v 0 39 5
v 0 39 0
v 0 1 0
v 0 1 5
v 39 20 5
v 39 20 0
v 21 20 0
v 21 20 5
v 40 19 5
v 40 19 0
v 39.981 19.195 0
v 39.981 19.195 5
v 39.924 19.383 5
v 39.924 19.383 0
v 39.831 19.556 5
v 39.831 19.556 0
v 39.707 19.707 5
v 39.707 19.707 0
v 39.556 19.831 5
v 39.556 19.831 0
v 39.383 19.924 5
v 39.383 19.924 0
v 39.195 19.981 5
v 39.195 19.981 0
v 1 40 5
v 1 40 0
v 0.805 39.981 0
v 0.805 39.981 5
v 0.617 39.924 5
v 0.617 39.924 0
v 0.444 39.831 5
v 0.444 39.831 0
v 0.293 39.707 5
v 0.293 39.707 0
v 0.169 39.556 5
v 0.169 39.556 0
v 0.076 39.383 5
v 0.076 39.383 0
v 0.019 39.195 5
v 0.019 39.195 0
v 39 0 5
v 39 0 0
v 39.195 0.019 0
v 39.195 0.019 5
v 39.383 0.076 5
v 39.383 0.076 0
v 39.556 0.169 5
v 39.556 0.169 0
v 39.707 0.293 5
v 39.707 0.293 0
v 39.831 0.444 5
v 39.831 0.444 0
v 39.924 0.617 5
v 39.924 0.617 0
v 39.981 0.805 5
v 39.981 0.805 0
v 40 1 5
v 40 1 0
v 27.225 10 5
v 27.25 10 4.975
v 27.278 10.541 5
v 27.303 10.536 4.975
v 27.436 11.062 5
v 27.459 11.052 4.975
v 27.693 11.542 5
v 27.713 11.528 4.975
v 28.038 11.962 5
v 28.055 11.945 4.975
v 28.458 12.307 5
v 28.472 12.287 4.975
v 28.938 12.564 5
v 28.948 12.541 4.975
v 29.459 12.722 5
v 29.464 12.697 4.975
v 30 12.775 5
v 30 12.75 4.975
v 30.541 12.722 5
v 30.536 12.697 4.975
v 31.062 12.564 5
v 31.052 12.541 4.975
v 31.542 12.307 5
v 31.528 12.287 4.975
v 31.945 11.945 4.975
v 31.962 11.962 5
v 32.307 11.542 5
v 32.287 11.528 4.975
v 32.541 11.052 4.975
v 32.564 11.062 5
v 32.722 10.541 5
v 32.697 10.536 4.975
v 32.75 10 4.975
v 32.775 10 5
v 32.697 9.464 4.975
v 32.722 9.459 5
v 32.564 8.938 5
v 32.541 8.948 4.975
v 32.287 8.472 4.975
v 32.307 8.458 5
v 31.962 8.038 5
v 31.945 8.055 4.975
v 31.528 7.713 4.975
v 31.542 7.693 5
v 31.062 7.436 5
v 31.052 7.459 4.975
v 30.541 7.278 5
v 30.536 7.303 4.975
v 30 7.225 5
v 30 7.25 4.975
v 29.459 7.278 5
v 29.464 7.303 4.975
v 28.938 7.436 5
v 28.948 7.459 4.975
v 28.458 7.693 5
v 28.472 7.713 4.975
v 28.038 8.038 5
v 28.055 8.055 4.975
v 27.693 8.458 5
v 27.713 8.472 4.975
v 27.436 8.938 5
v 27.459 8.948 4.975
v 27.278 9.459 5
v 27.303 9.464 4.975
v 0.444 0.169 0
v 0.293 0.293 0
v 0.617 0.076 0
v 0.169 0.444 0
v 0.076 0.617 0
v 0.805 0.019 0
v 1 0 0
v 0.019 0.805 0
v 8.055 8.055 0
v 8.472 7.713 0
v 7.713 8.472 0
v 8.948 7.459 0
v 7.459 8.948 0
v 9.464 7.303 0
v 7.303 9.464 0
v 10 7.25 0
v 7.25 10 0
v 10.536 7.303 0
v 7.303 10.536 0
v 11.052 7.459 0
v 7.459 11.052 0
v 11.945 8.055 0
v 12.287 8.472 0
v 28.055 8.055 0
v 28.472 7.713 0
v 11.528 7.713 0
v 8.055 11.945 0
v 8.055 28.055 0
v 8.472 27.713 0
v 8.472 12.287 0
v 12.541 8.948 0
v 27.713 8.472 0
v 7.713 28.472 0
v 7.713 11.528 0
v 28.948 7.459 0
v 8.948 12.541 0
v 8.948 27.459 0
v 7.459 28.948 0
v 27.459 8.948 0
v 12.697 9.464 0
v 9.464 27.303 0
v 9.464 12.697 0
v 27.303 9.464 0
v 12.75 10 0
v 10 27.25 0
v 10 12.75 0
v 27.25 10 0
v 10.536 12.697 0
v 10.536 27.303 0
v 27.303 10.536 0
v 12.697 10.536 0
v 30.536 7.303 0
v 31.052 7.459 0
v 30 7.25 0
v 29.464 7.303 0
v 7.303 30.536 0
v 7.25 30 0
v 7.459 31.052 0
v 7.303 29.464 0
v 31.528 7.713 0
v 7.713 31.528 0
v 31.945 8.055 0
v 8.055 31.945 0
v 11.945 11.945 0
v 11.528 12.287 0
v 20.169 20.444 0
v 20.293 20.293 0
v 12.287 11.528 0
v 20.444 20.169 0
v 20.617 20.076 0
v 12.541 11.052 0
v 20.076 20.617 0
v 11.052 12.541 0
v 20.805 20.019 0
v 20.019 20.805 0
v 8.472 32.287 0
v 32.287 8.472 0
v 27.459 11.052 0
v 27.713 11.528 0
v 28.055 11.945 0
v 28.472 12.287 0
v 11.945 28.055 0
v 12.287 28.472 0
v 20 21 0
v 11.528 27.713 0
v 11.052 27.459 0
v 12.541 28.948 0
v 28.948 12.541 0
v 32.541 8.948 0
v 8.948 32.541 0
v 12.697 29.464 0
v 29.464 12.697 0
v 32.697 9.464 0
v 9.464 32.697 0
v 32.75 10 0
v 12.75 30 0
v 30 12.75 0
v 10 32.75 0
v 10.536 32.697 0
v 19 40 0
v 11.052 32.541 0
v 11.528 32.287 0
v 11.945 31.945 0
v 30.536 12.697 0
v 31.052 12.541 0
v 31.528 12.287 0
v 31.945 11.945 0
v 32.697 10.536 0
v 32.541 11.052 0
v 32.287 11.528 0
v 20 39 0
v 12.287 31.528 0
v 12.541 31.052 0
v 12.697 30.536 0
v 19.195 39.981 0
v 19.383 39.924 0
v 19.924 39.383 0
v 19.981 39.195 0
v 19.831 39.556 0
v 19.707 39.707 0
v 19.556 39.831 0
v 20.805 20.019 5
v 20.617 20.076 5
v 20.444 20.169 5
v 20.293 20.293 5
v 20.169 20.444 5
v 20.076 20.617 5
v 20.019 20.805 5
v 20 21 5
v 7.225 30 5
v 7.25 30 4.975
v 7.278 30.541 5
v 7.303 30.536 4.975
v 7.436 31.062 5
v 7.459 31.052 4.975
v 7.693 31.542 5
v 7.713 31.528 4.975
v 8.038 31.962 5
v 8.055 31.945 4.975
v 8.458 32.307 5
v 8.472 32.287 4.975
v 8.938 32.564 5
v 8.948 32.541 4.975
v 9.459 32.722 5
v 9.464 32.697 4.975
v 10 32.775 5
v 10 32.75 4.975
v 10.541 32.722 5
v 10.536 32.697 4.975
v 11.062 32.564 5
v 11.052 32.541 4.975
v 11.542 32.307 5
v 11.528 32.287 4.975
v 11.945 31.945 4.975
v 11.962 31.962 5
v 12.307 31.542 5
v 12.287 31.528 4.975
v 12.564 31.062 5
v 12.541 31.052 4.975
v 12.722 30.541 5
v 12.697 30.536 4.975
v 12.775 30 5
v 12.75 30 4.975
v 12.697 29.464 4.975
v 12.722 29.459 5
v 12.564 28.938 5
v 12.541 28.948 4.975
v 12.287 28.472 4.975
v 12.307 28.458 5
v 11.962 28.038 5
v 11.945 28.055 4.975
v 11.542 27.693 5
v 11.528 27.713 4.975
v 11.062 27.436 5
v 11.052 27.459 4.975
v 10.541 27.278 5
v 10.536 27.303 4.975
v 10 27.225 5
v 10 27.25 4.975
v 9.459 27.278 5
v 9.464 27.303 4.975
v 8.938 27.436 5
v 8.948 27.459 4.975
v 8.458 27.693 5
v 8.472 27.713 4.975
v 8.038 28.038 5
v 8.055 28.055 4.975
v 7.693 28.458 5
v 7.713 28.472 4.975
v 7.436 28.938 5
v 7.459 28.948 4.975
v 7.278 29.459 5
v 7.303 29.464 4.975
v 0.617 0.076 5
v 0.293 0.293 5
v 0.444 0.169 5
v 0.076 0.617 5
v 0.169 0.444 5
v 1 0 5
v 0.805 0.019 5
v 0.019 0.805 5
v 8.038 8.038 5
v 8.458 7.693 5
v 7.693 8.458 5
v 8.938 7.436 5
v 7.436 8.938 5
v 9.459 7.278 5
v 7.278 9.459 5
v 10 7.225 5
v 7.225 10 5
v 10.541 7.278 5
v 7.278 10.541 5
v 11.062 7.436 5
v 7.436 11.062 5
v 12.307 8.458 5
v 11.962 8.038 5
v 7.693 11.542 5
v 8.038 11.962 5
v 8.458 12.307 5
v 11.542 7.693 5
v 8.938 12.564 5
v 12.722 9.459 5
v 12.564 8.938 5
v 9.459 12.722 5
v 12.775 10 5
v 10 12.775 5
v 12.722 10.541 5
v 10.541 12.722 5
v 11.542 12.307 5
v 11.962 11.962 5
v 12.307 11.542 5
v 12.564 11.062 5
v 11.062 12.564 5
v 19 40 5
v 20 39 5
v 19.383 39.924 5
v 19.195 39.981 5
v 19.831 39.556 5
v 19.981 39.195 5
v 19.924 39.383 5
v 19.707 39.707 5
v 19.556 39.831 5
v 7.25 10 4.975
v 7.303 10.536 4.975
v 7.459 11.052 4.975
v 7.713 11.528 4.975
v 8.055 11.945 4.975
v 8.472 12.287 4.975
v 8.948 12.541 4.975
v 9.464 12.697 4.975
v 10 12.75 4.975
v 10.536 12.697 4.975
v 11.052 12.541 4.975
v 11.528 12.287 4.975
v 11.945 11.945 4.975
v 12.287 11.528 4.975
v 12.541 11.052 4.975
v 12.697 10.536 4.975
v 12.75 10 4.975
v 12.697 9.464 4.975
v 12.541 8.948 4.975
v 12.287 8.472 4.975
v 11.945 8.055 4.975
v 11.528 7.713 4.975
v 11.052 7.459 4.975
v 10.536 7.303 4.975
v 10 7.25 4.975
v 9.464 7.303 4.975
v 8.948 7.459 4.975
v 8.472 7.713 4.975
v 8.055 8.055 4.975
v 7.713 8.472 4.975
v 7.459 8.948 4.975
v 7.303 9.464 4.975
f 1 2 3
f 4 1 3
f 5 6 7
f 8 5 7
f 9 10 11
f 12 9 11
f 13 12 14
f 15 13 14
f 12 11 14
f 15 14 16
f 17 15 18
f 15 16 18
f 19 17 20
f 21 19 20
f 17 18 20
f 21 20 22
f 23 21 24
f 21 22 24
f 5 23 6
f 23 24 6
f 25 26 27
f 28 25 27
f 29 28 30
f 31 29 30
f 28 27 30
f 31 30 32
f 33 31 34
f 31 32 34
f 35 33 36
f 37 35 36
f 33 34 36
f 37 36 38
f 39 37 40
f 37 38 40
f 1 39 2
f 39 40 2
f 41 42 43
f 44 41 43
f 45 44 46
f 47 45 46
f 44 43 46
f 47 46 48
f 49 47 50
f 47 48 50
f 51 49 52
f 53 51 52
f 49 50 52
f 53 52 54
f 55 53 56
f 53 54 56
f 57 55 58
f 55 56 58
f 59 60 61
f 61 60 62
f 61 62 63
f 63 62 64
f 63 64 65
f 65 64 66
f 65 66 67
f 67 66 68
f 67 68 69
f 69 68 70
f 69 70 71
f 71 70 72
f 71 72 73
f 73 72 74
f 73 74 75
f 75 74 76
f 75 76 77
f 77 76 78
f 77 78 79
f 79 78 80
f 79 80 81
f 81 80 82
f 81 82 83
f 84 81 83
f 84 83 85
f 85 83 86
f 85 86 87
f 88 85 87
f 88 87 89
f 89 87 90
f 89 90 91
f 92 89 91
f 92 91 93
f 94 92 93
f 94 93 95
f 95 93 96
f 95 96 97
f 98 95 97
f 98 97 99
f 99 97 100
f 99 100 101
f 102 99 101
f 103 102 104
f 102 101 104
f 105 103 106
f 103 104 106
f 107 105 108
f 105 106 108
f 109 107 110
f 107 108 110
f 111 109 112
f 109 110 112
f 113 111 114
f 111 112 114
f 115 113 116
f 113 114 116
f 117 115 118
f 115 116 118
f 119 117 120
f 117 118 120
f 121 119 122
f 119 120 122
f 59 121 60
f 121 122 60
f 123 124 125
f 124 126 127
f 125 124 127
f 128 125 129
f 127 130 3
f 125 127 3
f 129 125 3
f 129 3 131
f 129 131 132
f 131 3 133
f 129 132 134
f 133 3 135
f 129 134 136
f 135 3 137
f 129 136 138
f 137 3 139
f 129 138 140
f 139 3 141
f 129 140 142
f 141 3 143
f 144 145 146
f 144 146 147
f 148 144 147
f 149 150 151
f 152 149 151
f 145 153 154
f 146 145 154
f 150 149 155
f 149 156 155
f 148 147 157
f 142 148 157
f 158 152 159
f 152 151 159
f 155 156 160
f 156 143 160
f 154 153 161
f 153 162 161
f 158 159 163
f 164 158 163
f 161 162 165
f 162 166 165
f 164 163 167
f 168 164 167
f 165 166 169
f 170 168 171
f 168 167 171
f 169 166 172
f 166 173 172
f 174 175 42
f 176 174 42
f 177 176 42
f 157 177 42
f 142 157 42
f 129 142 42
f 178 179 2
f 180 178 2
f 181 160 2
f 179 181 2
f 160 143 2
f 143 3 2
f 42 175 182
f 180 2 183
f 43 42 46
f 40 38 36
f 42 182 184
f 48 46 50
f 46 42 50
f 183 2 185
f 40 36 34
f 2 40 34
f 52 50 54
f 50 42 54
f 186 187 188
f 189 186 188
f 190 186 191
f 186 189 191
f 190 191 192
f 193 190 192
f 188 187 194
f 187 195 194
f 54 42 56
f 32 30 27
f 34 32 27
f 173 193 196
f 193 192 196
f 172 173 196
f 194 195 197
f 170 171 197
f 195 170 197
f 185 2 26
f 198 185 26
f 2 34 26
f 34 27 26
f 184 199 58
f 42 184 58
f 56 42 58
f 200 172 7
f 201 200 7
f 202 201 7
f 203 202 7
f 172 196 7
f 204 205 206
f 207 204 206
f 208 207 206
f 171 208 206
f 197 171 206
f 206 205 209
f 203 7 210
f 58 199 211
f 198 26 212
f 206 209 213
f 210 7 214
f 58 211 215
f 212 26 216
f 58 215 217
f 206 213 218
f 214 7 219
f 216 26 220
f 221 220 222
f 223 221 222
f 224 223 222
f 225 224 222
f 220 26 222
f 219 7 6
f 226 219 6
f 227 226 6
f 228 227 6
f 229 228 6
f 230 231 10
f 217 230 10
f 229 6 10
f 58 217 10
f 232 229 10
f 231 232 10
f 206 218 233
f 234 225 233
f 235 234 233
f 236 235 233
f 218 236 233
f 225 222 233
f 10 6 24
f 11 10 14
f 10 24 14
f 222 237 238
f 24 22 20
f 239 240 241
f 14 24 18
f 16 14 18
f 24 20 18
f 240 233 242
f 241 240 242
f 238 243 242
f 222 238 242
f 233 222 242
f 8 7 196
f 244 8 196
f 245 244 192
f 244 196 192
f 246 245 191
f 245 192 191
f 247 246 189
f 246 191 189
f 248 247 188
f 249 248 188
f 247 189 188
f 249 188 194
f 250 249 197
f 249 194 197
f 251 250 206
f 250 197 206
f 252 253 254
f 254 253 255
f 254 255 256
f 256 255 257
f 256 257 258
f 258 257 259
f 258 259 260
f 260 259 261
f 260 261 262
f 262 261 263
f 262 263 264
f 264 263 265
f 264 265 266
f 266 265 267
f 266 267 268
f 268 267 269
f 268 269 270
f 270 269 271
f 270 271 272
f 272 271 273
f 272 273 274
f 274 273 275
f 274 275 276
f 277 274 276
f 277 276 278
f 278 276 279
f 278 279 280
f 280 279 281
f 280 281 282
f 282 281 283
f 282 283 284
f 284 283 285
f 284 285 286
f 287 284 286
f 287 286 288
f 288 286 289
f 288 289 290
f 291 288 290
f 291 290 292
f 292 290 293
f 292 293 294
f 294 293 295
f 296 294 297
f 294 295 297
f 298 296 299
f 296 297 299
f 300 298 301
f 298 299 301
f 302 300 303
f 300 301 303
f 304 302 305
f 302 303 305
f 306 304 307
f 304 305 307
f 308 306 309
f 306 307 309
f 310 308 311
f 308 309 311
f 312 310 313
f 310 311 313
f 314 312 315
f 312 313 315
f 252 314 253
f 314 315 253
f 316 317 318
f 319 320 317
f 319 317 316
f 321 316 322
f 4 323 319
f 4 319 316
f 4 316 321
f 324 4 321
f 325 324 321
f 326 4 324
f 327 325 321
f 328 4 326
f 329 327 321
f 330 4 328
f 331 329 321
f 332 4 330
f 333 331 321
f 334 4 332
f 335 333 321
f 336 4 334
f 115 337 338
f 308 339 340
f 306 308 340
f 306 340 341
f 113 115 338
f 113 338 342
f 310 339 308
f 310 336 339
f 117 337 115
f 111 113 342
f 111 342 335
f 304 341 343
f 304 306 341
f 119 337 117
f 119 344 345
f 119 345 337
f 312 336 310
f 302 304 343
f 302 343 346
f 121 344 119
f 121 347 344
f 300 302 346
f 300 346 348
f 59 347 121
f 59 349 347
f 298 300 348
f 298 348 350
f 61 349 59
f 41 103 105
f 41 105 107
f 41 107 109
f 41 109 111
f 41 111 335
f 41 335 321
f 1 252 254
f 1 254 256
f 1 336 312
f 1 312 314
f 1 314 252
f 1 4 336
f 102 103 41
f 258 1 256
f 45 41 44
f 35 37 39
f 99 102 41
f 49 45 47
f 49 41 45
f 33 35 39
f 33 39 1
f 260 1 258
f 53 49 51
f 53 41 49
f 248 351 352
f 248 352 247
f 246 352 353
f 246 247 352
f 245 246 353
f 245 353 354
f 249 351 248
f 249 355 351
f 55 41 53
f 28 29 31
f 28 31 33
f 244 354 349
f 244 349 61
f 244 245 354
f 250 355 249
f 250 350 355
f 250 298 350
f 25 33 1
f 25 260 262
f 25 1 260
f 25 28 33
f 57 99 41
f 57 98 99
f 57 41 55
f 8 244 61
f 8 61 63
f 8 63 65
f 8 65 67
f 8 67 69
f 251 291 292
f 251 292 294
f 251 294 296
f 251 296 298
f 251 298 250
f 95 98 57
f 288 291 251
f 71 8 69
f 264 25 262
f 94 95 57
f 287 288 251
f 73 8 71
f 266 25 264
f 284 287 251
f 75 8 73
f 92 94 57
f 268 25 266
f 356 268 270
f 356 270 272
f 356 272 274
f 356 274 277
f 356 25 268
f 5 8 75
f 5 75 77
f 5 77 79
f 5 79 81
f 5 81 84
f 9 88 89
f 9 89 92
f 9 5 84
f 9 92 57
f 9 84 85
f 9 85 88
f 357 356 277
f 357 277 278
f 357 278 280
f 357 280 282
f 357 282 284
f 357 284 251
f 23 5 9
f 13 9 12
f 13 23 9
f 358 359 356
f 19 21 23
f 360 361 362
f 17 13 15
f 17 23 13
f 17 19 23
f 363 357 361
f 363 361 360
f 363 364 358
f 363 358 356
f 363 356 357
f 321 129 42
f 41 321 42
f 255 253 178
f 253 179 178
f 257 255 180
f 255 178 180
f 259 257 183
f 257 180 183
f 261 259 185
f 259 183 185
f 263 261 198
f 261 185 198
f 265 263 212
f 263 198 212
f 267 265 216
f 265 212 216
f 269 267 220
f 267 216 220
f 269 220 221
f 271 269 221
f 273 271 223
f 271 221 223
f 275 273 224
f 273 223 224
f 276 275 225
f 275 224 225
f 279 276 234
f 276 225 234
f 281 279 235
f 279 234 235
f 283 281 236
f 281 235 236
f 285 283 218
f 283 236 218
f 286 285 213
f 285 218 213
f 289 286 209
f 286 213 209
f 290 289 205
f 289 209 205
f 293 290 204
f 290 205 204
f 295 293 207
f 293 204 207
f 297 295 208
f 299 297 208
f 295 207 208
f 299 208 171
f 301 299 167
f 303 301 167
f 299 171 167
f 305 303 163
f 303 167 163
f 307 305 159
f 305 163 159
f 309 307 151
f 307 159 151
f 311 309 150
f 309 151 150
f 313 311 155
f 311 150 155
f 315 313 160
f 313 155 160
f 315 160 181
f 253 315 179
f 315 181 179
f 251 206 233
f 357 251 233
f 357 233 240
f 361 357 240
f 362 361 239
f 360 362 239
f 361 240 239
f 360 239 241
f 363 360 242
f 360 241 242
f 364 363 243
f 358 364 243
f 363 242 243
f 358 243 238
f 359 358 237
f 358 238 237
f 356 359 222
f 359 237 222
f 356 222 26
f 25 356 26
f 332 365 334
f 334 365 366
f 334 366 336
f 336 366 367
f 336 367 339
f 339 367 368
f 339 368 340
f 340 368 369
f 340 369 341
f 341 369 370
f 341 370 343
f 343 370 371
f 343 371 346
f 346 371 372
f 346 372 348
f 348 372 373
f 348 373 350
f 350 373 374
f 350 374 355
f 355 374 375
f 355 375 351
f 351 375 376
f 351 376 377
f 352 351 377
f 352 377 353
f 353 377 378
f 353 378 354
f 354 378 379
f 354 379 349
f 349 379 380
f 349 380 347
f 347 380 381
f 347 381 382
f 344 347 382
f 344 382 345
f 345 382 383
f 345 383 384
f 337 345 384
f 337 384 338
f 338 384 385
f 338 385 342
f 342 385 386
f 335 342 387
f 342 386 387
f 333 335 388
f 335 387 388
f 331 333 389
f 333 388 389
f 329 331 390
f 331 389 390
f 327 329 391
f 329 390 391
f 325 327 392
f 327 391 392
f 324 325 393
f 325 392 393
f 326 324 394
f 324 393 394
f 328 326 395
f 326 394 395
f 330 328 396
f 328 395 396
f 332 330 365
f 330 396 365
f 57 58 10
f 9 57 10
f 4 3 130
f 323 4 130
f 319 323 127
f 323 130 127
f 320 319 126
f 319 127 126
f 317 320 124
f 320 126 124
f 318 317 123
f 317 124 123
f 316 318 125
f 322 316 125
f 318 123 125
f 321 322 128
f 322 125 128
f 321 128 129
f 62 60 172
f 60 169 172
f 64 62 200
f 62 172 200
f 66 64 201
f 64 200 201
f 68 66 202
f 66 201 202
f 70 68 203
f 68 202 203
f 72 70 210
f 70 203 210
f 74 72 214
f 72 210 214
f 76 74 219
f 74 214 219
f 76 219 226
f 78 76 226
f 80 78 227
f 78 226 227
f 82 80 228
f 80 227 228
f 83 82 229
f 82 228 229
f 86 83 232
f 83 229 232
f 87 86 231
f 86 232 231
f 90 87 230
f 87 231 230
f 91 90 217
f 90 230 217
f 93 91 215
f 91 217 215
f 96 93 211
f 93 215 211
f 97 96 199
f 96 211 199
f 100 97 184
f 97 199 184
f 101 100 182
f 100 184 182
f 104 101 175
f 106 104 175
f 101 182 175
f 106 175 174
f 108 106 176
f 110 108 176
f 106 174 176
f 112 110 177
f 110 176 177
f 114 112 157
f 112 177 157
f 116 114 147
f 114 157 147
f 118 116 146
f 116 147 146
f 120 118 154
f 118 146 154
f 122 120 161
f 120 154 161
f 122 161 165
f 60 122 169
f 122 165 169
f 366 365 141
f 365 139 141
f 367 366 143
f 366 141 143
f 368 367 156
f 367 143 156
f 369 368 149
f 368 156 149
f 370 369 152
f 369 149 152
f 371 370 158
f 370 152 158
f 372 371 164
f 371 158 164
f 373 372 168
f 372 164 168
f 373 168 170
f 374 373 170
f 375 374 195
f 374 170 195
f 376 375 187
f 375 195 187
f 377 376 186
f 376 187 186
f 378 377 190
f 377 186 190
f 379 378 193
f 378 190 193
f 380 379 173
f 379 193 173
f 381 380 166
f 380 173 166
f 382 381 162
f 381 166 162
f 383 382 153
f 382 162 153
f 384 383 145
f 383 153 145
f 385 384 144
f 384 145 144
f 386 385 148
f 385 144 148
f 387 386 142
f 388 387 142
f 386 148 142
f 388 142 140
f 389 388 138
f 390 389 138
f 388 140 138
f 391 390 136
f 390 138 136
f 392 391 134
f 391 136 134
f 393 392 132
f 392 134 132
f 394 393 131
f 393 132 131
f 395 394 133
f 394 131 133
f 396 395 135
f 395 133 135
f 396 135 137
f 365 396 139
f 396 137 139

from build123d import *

# Parameters (mm, degrees)
BOSS_EXTRUDE1_DEPTH            = 5
M5_CLEARANCE_HOLE1_D           = 5.5
M5_CLEARANCE_HOLE1_CSINK_D     = 5.55
M5_CLEARANCE_HOLE1_CSINK_ANGLE = 90


with BuildPart() as part:
    # Sketch1 → Boss-Extrude1 (new body)
    with BuildSketch(Plane.XY):
        with BuildLine():
            Line((1, 0), (39, 0))
            ThreePointArc((39, 0), (39.707106781, 0.292893219), (40, 1))
            Line((40, 1), (40, 19))
            ThreePointArc((40, 19), (39.707106781, 19.707106781), (39, 20))
            Line((39, 20), (21, 20))
            ThreePointArc((21, 20), (20.292893219, 20.292893219), (20, 21))
            Line((20, 21), (20, 39))
            ThreePointArc((20, 39), (19.707106781, 39.707106781), (19, 40))
            Line((19, 40), (1, 40))
            ThreePointArc((1, 40), (0.292893219, 39.707106781), (0, 39))
            Line((0, 39), (0, 1))
            ThreePointArc((0, 1), (0.292893219, 0.292893219), (1, 0))
        make_face()
    extrude(amount=BOSS_EXTRUDE1_DEPTH)

    # M5 Clearance Hole1 (through all)
    with Locations(Plane.XY.offset(5)):
        with Locations((10, 30), (10, 10), (30, 10)):
            CounterSinkHole(M5_CLEARANCE_HOLE1_D / 2, M5_CLEARANCE_HOLE1_CSINK_D / 2, counter_sink_angle=M5_CLEARANCE_HOLE1_CSINK_ANGLE)


solid = part.part
